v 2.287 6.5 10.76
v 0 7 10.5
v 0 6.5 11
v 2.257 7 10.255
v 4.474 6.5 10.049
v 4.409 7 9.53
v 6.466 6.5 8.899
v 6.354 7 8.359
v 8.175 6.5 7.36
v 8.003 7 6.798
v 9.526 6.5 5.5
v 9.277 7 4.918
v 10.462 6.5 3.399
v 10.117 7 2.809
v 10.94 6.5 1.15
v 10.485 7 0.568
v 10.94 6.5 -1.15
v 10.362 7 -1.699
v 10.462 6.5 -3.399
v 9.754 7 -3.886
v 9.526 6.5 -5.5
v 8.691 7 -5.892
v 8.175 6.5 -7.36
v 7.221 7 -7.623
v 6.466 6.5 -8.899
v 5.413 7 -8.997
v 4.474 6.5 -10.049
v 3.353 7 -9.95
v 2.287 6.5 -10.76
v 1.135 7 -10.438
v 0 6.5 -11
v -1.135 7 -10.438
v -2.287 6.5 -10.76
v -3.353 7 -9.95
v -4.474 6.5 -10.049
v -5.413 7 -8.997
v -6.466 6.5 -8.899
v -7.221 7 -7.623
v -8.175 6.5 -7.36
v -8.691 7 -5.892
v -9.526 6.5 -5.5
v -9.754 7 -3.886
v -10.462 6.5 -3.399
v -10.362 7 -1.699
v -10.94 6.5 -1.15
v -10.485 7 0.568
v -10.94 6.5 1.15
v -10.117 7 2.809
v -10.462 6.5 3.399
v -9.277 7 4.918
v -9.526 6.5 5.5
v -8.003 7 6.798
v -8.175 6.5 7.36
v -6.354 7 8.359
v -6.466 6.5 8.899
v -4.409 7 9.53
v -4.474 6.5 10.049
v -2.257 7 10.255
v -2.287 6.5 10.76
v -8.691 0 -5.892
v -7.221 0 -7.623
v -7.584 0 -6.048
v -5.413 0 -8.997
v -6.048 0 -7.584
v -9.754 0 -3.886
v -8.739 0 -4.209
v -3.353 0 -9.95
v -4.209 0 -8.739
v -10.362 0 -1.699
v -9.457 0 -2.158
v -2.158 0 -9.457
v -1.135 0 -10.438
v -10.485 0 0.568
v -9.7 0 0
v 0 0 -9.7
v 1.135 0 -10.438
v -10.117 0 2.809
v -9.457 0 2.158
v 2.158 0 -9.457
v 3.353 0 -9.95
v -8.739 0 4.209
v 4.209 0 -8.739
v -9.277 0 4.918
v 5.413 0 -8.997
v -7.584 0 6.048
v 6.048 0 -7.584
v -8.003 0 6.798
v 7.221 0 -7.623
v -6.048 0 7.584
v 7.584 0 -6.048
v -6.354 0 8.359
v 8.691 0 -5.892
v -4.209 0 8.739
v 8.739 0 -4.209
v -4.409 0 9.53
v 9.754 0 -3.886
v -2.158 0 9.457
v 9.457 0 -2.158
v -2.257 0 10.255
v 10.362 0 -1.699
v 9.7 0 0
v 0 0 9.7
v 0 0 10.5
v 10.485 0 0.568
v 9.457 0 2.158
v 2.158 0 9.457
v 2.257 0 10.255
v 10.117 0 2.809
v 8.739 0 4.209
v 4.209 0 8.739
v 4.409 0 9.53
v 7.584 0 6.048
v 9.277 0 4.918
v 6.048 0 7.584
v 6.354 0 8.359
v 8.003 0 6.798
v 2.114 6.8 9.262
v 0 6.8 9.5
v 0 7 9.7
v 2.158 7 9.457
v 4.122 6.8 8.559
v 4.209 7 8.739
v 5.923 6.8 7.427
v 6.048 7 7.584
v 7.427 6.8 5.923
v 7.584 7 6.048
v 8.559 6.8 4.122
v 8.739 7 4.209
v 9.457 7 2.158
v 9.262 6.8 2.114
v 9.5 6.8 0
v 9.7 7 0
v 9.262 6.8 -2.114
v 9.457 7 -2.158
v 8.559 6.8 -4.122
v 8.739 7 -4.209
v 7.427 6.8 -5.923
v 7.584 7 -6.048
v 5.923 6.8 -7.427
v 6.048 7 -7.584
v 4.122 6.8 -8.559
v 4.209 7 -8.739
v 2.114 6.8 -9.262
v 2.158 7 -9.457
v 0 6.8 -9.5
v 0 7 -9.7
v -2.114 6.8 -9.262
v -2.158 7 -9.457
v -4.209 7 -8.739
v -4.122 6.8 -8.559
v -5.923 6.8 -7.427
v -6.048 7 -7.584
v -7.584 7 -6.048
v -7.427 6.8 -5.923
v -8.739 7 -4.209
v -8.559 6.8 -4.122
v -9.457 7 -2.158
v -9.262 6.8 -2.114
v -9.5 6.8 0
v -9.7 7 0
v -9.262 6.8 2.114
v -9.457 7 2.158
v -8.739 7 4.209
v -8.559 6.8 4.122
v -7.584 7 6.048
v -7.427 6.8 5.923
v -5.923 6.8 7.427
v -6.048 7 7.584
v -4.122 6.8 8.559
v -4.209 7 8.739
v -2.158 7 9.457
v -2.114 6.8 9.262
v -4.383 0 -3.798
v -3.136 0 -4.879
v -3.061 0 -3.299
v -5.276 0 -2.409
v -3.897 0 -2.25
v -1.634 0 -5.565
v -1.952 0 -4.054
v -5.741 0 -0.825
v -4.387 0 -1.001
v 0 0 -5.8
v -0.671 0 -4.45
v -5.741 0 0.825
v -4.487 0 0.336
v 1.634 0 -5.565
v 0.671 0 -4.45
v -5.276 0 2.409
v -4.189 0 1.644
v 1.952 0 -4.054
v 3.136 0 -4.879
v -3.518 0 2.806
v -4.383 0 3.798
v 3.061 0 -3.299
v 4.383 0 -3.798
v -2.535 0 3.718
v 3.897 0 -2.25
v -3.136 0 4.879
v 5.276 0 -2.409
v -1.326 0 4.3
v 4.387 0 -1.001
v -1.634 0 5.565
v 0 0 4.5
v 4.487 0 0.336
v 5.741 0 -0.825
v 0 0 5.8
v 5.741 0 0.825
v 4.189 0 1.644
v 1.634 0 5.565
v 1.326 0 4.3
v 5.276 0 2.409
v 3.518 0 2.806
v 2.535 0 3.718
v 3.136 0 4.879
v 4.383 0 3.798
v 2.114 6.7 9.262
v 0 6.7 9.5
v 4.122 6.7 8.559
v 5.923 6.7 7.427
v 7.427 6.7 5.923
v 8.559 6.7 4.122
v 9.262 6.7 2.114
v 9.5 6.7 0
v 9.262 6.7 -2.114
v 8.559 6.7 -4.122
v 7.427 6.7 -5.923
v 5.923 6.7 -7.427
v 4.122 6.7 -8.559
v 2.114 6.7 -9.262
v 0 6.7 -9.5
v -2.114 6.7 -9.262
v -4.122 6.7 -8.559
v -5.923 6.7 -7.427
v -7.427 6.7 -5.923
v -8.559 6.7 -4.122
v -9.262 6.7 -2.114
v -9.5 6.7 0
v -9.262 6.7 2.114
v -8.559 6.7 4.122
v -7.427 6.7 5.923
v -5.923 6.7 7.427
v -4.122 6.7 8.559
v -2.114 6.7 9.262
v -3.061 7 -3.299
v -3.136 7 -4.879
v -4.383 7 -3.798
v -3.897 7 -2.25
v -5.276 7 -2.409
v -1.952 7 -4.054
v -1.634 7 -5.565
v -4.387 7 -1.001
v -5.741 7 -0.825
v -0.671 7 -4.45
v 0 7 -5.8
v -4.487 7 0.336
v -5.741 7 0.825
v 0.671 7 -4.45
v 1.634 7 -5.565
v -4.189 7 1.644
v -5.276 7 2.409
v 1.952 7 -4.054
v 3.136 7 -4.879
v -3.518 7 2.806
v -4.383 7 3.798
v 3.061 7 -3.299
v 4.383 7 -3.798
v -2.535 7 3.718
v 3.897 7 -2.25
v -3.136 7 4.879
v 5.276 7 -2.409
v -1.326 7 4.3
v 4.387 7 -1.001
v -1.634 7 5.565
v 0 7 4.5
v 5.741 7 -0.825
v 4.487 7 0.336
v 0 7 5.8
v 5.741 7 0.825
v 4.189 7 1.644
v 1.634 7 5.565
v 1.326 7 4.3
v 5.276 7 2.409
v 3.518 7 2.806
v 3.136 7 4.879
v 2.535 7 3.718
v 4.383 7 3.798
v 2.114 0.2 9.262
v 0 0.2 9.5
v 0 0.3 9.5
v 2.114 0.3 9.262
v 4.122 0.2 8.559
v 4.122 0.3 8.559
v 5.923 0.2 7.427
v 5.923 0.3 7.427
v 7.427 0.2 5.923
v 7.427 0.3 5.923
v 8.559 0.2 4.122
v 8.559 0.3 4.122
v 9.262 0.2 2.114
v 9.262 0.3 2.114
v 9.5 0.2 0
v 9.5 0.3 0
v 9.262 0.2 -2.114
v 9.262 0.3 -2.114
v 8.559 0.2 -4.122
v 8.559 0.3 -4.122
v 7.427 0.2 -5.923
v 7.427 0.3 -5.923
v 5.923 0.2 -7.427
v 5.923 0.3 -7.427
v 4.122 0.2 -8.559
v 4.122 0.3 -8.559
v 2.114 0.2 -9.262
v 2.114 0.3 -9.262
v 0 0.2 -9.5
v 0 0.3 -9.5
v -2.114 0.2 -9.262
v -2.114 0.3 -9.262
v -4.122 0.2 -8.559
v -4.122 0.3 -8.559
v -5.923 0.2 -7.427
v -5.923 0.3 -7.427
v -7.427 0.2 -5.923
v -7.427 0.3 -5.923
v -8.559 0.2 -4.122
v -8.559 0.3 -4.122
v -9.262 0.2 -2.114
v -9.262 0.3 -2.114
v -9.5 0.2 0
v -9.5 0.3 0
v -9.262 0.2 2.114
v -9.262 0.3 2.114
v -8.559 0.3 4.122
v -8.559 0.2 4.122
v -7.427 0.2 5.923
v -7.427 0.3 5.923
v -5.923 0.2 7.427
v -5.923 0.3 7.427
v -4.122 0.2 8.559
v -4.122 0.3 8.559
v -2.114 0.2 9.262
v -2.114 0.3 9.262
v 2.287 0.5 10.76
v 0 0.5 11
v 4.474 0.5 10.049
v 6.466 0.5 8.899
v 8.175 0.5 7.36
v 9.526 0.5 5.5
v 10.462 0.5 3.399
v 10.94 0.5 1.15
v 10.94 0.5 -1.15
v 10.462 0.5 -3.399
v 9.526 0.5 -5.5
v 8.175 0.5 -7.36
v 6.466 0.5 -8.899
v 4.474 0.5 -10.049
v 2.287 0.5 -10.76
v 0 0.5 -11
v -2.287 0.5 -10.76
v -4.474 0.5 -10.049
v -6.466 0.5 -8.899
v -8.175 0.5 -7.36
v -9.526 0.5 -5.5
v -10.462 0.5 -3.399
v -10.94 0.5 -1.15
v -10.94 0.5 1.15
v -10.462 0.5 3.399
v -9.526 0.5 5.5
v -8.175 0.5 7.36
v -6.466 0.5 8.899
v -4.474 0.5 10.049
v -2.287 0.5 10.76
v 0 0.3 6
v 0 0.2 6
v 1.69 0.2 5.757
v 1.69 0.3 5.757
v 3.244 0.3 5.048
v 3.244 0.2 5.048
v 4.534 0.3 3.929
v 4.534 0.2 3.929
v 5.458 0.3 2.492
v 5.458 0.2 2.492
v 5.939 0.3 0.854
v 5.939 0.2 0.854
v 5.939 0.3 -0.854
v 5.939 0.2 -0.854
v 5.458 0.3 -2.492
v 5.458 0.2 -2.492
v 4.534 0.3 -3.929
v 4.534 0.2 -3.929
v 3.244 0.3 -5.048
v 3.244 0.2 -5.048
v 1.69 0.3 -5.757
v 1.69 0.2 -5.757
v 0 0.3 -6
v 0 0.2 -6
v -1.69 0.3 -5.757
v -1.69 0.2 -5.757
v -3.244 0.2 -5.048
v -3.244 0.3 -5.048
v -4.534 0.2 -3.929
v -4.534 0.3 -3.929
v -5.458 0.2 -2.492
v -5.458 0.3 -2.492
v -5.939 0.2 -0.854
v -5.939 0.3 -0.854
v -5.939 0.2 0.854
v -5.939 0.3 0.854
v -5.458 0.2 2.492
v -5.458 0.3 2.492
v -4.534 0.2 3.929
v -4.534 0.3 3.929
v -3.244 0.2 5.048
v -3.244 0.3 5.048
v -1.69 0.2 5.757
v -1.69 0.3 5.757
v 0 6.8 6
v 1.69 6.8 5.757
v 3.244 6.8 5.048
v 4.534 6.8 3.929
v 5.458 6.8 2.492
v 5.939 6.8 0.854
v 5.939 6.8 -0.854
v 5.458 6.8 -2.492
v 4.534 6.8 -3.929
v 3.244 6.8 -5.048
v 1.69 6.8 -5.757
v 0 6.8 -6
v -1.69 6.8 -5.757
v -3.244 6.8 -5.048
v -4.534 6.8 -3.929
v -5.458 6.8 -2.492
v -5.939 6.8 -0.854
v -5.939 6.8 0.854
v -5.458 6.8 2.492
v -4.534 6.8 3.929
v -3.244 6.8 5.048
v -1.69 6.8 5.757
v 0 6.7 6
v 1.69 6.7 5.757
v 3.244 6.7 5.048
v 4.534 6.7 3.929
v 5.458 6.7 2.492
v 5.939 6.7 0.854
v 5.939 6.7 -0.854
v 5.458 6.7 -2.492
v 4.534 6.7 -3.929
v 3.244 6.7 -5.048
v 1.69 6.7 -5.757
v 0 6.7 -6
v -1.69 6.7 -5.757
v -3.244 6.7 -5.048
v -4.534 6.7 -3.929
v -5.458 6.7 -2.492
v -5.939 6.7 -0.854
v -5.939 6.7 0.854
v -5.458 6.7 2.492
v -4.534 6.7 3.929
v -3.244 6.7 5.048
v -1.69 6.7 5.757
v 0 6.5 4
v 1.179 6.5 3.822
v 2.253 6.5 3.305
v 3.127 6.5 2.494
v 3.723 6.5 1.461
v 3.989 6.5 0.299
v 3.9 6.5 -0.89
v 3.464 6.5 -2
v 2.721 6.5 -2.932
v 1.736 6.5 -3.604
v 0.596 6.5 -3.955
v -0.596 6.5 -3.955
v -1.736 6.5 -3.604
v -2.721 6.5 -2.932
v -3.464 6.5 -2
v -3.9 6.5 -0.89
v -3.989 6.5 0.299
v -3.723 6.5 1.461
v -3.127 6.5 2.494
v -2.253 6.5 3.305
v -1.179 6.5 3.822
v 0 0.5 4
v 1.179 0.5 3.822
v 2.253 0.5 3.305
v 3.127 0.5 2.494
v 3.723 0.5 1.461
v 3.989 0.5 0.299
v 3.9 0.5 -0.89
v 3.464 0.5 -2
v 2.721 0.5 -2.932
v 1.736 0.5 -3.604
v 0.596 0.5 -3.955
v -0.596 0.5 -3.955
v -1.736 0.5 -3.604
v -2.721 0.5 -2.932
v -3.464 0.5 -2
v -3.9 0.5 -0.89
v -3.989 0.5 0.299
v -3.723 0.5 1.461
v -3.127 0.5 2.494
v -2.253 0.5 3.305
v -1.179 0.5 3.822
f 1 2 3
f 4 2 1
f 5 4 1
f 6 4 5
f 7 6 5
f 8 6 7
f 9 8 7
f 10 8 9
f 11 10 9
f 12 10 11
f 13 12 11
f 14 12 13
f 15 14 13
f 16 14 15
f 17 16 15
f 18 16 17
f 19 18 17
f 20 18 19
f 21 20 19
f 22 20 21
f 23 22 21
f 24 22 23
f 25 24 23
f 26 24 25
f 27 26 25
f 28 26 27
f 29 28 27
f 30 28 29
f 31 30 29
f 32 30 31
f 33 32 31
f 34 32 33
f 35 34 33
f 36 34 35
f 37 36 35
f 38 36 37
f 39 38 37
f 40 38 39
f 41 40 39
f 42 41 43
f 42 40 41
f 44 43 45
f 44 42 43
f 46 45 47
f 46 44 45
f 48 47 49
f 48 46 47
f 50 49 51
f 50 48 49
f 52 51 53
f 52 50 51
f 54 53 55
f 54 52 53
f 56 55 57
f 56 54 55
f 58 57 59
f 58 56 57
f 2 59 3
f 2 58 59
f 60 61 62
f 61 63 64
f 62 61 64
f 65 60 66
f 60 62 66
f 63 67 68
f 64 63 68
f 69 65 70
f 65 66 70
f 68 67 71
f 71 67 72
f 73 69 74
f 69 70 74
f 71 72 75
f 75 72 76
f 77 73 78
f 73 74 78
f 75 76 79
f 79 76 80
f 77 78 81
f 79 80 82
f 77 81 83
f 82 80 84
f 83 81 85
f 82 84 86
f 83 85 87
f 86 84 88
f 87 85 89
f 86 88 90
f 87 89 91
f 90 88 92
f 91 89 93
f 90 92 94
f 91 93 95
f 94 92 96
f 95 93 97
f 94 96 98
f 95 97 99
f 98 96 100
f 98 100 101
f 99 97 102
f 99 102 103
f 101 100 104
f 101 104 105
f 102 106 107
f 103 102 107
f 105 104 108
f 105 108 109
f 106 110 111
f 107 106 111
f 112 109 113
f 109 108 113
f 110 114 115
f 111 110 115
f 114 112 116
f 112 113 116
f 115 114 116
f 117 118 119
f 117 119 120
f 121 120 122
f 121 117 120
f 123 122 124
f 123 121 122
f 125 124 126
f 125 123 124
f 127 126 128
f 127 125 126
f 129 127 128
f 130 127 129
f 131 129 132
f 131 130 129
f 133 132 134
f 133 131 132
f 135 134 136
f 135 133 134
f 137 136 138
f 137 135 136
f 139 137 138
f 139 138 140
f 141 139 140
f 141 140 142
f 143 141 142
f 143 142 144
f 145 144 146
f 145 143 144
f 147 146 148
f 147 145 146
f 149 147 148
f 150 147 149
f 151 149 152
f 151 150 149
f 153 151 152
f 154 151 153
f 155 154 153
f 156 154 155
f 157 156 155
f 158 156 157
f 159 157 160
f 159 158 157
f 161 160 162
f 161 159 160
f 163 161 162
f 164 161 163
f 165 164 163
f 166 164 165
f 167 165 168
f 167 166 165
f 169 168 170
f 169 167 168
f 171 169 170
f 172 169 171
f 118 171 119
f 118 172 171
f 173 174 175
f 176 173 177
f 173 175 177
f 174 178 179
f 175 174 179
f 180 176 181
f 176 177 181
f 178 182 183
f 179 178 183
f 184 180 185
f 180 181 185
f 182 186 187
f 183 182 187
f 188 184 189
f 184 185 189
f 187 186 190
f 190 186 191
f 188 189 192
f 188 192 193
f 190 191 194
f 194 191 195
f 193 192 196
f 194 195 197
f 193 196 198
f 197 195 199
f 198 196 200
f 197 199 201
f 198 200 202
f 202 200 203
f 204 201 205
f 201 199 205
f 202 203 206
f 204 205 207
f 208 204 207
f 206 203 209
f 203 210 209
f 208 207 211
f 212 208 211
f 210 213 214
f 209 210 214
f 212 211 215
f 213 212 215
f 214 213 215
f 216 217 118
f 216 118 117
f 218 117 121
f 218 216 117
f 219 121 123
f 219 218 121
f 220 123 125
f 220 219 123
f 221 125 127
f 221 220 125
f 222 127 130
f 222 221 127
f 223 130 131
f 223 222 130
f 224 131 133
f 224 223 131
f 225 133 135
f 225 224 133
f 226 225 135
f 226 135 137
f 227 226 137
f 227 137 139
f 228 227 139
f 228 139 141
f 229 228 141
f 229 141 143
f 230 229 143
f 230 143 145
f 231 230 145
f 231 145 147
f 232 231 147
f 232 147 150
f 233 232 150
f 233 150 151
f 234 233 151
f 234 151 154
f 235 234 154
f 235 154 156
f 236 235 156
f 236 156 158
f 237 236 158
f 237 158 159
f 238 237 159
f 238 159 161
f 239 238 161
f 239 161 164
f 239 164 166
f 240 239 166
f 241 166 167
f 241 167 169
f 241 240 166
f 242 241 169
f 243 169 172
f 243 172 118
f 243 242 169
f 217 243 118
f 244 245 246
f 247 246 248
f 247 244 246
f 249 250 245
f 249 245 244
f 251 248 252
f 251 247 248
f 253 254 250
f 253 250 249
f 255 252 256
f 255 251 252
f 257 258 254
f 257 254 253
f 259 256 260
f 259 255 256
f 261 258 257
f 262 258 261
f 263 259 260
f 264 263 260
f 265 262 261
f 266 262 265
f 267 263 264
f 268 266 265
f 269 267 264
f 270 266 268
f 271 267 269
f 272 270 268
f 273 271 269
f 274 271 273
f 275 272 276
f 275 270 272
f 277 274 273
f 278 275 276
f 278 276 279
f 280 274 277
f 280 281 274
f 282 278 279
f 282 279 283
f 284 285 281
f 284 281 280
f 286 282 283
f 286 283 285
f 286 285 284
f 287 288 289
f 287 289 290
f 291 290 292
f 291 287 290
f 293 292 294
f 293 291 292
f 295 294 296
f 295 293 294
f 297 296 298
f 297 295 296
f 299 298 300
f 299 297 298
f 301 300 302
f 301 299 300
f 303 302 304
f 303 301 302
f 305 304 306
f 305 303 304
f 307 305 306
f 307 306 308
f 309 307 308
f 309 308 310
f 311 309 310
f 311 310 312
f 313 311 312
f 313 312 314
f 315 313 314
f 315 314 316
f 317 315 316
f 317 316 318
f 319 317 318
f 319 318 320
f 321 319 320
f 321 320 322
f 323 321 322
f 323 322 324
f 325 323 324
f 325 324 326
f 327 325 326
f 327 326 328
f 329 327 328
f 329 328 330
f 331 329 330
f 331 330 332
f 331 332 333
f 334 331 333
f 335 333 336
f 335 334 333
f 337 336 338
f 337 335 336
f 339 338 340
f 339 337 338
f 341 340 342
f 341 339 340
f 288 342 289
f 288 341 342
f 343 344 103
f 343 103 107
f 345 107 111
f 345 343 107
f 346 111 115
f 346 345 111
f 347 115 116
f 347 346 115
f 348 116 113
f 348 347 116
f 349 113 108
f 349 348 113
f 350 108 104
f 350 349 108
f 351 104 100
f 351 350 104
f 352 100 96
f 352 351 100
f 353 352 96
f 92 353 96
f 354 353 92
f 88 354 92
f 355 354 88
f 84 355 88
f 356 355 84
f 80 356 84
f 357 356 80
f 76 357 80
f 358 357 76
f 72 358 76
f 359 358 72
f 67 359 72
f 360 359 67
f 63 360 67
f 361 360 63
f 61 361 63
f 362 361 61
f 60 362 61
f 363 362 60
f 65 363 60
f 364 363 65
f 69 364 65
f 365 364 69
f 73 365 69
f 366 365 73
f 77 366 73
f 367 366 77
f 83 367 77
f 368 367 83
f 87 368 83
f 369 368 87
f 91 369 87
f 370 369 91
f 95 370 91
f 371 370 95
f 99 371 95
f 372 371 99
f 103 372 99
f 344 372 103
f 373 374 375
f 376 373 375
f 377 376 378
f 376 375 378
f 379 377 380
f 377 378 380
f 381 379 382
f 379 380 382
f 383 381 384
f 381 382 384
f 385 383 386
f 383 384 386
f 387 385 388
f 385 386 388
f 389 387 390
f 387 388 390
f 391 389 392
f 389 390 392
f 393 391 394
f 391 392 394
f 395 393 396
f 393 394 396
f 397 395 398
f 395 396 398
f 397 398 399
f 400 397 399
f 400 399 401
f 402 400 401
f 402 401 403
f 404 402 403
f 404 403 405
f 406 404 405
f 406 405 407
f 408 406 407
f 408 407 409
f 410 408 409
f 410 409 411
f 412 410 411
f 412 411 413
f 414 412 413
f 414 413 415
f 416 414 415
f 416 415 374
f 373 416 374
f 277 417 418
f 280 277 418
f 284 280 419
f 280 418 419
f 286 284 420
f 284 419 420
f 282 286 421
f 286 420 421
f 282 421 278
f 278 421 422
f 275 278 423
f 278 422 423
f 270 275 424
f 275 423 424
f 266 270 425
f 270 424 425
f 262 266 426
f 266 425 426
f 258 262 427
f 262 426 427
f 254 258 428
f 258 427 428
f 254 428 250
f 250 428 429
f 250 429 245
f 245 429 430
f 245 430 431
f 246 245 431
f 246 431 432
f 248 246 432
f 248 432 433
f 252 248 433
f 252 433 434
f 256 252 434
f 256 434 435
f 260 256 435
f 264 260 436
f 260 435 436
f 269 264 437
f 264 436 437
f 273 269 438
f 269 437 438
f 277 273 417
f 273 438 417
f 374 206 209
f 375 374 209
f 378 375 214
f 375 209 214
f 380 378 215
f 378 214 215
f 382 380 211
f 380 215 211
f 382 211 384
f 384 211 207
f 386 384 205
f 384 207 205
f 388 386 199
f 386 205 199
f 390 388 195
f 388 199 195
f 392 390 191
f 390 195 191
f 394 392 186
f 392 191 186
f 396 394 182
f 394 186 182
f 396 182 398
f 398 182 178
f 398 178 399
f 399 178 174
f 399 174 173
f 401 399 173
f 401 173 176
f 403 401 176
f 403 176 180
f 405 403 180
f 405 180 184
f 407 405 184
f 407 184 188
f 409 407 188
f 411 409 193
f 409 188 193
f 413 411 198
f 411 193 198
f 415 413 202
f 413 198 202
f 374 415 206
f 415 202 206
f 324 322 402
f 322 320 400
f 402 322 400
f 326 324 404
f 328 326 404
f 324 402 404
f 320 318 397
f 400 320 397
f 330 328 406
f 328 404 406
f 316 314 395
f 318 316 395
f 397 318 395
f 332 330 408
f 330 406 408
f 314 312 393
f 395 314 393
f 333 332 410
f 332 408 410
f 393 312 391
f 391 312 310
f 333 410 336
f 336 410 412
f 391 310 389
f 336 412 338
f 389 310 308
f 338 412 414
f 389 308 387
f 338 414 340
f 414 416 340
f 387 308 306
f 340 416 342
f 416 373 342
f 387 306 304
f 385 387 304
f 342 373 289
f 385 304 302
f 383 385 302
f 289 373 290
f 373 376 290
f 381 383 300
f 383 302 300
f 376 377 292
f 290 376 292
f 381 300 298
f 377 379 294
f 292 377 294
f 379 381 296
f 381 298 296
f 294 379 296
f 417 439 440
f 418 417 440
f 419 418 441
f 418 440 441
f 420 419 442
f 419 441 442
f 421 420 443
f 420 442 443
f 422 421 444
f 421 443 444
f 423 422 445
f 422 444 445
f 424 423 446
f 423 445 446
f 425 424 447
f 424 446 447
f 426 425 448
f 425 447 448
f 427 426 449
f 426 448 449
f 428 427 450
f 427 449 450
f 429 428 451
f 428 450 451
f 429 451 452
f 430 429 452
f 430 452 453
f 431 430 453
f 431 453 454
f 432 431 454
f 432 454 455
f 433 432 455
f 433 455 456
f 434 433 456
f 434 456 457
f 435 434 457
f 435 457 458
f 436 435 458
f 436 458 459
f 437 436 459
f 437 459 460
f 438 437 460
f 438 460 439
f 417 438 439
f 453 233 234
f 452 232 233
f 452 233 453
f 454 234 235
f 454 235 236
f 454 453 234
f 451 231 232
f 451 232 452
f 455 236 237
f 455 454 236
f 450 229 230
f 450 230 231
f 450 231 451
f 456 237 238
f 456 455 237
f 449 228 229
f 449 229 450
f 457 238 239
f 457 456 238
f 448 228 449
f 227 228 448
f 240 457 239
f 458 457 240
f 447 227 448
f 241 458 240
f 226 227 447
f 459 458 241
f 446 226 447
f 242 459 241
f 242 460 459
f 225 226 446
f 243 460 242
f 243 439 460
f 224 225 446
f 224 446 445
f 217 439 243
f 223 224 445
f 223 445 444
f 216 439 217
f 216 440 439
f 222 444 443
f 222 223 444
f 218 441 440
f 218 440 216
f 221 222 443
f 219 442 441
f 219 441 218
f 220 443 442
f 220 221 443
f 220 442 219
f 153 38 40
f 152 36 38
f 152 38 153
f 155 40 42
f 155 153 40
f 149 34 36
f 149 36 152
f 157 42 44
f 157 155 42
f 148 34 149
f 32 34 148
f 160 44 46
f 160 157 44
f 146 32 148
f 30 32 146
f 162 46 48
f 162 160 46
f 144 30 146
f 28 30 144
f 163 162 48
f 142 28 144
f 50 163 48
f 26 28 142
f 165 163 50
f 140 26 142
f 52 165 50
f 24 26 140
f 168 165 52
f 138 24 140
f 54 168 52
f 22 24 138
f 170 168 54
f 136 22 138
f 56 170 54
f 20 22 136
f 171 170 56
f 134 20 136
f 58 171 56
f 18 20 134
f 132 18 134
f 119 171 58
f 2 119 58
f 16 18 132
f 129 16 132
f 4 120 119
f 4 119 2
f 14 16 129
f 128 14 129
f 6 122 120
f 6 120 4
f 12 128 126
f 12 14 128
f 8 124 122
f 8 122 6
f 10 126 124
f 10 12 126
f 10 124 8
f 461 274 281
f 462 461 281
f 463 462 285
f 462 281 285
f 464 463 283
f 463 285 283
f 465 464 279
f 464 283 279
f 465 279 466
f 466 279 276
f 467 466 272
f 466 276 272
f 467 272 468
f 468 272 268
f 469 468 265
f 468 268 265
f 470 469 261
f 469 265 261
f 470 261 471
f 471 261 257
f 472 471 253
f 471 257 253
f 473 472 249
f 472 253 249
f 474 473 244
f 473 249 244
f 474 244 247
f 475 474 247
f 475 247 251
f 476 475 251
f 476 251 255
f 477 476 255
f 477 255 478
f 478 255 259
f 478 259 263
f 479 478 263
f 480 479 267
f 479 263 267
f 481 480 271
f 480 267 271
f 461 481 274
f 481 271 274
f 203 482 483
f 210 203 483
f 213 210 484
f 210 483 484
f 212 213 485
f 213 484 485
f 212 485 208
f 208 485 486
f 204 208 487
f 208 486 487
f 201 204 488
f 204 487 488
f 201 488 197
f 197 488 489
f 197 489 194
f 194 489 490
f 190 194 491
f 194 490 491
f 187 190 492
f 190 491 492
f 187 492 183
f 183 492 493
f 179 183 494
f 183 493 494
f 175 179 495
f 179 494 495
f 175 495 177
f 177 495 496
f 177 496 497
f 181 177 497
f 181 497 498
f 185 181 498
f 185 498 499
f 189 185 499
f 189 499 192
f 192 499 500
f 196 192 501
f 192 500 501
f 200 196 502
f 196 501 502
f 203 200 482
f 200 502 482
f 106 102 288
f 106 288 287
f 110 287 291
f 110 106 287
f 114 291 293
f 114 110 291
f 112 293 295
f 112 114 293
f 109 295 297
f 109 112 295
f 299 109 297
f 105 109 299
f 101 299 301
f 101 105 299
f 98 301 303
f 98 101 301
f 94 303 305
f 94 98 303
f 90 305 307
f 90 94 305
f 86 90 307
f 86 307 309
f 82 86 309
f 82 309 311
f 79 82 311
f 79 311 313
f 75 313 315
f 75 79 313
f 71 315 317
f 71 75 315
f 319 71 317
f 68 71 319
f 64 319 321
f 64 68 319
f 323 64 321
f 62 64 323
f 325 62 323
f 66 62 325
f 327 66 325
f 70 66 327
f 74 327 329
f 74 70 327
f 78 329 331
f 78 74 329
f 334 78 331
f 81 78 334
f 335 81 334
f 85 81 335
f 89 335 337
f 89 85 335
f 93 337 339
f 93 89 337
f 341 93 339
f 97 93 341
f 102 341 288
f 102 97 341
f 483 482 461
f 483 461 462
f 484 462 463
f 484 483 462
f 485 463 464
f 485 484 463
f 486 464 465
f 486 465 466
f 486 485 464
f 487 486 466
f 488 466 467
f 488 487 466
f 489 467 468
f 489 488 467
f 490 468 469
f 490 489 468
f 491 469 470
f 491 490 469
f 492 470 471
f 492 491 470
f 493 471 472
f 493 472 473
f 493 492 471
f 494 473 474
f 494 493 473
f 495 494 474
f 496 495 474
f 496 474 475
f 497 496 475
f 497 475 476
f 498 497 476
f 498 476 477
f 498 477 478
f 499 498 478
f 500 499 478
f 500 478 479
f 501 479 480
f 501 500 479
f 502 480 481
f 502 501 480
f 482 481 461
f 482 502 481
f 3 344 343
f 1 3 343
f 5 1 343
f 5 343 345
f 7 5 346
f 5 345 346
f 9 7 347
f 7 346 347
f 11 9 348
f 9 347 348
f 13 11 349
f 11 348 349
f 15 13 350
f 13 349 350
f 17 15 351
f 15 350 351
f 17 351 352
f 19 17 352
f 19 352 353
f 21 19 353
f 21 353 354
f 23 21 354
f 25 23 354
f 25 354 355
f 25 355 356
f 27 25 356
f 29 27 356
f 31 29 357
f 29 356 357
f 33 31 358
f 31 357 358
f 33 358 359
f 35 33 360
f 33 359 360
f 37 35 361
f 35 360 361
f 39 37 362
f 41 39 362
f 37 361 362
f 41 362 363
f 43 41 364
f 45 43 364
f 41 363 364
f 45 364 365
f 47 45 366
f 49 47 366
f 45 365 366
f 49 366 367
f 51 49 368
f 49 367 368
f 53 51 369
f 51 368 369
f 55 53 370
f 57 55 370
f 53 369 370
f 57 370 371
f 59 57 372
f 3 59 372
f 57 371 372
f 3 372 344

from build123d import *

# Parameters (mm, degrees)
SKETCH1_R             = 11
SKETCH1_R_2           = 9.5
BOSS_EXTRUDE1_DEPTH   = 7
SKETCH1_R_3           = 6
SKETCH1_R_4           = 4
BOSS_EXTRUDE1_2_DEPTH = 7
BOSS_EXTRUDE2_START   = -6.4
SKETCH2_R             = 9.5
SKETCH2_R_2           = 6
BOSS_EXTRUDE2_DEPTH   = 6.4
CHAMFER1_SIZE         = 0.2
CHAMFER2_SIZE         = 0.5


with BuildPart() as part:
    # Sketch1 → Boss-Extrude1 (new body)
    with BuildSketch(Plane(origin=(0, 0, 0), x_dir=(1, 0, 0), z_dir=(0, 1, 0))):
        with Locations(Location((0, 0, 0), (0, 0, 270))):
            Circle(SKETCH1_R)
        with Locations(Location((0, 0, 0), (0, 0, 270))):
            Circle(SKETCH1_R_2, mode=Mode.SUBTRACT)
    extrude(amount=BOSS_EXTRUDE1_DEPTH)



with BuildPart() as body_2:
    # Sketch1 → Boss-Extrude1 2 (new body)
    with BuildSketch(Plane(origin=(0, 0, 0), x_dir=(1, 0, 0), z_dir=(0, 1, 0))):
        with Locations(Location((0, 0, 0), (0, 0, 270))):
            Circle(SKETCH1_R_3)
        with Locations(Location((0, 0, 0), (0, 0, 270))):
            Circle(SKETCH1_R_4, mode=Mode.SUBTRACT)
    extrude(amount=BOSS_EXTRUDE1_2_DEPTH)


with BuildPart() as part_1:
    add(part.part)

    add(body_2.part)  # Boss-Extrude2 merges body 2
    # Sketch2 → Boss-Extrude2 (add)
    with BuildSketch(Plane(origin=(0, 6.7, 0), x_dir=(1, 0, 0), z_dir=(0, 1, 0)).offset(BOSS_EXTRUDE2_START)):
        with Locations(Location((0, 0, 0), (0, 0, 270))):
            Circle(SKETCH2_R)
        with Locations(Location((0, 0, 0), (0, 0, 270))):
            Circle(SKETCH2_R_2, mode=Mode.SUBTRACT)
    extrude(amount=BOSS_EXTRUDE2_DEPTH)

    # Chamfer1
    chamfer1_edges = [part_1.edges().sort_by_distance(p)[0] for p in [
        (0, 0, -6),
        (0, 7, -6),
        (0, 0, -9.5),
        (0, 7, -9.5),
    ]]
    chamfer(chamfer1_edges, length=CHAMFER1_SIZE)

    # Chamfer2
    chamfer2_edges = [part_1.edges().sort_by_distance(p)[0] for p in [
        (0, 7, -11),
        (0, 7, -4),
        (0, 0, -4),
        (0, 0, -11),
    ]]
    chamfer(chamfer2_edges, length=CHAMFER2_SIZE)


solid = part_1.part
